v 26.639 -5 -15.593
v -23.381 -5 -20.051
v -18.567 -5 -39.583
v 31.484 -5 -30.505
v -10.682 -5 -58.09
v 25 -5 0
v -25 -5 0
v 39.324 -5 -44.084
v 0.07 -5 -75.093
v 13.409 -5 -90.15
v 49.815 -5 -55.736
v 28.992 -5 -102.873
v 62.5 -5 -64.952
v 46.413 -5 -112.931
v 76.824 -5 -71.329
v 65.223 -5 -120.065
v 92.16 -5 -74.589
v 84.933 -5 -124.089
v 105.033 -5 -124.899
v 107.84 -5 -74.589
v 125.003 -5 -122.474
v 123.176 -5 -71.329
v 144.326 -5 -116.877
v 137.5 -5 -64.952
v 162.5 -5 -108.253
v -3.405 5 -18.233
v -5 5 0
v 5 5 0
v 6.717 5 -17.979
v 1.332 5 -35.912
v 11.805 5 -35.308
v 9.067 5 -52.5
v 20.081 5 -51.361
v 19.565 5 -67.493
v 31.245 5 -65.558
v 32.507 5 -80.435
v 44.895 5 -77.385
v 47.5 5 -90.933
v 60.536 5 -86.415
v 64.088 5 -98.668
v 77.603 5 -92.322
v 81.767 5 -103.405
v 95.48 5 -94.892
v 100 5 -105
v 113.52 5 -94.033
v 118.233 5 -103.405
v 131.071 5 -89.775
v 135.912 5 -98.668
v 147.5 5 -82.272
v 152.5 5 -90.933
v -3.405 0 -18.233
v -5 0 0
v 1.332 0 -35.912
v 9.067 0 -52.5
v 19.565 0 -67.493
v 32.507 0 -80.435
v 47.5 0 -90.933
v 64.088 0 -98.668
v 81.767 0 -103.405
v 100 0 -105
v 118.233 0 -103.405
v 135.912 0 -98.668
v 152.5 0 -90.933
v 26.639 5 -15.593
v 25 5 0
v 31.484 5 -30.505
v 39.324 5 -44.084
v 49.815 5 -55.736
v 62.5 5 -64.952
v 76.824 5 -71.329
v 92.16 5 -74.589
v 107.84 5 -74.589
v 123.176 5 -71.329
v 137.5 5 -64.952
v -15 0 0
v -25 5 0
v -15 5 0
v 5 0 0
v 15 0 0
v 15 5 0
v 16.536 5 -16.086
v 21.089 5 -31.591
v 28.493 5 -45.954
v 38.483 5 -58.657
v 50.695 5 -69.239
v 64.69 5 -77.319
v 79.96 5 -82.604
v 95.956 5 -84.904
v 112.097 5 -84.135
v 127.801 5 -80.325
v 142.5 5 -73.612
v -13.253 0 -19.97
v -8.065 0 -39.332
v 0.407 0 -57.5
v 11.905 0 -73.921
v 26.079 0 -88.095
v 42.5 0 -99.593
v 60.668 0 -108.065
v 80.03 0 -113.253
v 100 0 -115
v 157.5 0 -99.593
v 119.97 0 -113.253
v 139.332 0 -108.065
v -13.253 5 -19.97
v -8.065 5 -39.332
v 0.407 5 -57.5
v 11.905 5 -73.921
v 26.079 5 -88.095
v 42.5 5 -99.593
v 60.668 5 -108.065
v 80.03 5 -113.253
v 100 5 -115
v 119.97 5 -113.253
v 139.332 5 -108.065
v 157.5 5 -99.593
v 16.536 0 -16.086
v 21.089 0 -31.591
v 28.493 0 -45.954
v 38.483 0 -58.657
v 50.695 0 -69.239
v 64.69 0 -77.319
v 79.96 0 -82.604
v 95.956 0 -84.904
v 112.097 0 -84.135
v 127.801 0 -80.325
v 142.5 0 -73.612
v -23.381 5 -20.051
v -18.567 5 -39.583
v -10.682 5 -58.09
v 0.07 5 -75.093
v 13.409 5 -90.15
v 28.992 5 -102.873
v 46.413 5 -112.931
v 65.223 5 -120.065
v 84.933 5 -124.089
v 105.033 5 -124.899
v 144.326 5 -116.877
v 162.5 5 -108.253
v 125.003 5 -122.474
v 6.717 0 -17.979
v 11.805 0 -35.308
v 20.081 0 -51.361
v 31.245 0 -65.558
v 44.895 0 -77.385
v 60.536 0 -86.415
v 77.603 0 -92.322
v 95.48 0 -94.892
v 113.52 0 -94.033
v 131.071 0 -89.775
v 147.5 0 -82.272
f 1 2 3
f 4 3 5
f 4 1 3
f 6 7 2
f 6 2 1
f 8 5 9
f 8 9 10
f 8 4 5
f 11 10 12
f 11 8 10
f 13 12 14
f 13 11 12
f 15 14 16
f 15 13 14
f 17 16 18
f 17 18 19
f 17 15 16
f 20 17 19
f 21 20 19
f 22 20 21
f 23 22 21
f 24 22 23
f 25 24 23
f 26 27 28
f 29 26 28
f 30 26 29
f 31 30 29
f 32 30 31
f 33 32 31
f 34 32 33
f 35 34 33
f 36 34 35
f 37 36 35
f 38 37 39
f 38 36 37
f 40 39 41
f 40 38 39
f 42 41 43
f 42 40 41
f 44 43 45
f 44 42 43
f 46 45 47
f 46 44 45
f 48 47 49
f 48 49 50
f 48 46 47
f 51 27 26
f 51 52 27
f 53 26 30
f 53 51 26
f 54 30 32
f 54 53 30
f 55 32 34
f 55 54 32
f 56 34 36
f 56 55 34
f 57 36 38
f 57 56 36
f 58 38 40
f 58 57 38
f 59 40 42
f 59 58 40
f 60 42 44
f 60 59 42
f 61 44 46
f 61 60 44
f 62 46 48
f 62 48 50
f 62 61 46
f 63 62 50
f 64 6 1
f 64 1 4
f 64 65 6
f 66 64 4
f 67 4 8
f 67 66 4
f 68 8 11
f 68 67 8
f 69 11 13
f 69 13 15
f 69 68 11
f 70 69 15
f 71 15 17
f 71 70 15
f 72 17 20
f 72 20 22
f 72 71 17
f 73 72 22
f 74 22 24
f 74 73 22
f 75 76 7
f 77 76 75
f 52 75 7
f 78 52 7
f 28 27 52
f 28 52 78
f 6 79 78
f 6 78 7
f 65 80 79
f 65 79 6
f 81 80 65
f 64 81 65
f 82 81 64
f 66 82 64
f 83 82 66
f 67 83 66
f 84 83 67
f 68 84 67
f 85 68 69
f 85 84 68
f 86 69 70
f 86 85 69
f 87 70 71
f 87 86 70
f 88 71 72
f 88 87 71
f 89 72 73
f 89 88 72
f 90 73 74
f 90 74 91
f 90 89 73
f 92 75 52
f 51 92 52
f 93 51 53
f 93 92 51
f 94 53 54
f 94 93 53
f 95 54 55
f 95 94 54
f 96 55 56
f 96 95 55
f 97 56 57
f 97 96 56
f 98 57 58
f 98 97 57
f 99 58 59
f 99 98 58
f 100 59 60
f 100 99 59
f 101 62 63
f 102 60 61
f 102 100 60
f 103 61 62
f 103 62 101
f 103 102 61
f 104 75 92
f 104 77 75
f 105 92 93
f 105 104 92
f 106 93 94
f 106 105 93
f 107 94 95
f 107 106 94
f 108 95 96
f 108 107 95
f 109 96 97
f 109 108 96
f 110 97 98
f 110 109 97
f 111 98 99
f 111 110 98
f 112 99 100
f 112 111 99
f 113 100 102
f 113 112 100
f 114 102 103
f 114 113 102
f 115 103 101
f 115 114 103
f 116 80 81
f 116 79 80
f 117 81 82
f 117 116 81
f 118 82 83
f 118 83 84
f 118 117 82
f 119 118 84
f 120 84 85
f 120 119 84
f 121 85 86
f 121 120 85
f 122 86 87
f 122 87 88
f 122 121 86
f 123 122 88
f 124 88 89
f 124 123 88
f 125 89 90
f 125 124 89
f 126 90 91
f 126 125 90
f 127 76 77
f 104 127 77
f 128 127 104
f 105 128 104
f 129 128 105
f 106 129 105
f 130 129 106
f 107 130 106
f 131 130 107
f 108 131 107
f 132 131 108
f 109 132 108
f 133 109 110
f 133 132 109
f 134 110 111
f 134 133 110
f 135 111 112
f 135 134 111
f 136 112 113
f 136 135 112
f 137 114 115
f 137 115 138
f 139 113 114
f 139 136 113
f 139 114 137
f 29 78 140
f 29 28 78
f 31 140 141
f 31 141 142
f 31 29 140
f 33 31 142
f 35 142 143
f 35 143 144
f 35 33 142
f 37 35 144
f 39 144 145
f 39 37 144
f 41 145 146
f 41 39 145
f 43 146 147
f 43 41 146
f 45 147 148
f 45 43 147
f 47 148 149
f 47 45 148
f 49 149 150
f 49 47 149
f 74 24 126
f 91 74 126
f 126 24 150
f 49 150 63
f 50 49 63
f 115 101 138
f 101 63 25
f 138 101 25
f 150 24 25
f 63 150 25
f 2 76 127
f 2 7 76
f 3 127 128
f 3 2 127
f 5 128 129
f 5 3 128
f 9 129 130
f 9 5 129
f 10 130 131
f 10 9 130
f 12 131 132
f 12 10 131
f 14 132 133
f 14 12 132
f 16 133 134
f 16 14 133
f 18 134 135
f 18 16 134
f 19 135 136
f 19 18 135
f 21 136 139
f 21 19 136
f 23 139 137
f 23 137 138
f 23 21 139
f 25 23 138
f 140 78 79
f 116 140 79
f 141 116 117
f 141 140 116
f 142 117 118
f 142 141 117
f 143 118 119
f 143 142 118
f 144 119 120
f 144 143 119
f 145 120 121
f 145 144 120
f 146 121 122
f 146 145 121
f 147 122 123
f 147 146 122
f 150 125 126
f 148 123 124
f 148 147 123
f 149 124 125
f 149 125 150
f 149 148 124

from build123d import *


with BuildPart() as part:
    # Sweep1: sweep along a path in Sketch2
    with BuildLine(Plane(origin=(0, 0, 0), x_dir=(1, 0, 0), z_dir=(0, 1, 0))) as sweep1_path:
        ThreePointArc((0, 0), (50, 86.602540378), (150, 86.602540378))
    # Sketch1 → Sweep1 (sweep)
    with BuildSketch(Plane.XY):
        Polygon((25, -5), (-25, -5), (-25, 5), (-15, 5), (-15, 0), (-5, 0), (-5, 5), (5, 5), (5, 0), (15, 0), (15, 5), (25, 5), align=None)
    sweep(path=sweep1_path.line)


solid = part.part
